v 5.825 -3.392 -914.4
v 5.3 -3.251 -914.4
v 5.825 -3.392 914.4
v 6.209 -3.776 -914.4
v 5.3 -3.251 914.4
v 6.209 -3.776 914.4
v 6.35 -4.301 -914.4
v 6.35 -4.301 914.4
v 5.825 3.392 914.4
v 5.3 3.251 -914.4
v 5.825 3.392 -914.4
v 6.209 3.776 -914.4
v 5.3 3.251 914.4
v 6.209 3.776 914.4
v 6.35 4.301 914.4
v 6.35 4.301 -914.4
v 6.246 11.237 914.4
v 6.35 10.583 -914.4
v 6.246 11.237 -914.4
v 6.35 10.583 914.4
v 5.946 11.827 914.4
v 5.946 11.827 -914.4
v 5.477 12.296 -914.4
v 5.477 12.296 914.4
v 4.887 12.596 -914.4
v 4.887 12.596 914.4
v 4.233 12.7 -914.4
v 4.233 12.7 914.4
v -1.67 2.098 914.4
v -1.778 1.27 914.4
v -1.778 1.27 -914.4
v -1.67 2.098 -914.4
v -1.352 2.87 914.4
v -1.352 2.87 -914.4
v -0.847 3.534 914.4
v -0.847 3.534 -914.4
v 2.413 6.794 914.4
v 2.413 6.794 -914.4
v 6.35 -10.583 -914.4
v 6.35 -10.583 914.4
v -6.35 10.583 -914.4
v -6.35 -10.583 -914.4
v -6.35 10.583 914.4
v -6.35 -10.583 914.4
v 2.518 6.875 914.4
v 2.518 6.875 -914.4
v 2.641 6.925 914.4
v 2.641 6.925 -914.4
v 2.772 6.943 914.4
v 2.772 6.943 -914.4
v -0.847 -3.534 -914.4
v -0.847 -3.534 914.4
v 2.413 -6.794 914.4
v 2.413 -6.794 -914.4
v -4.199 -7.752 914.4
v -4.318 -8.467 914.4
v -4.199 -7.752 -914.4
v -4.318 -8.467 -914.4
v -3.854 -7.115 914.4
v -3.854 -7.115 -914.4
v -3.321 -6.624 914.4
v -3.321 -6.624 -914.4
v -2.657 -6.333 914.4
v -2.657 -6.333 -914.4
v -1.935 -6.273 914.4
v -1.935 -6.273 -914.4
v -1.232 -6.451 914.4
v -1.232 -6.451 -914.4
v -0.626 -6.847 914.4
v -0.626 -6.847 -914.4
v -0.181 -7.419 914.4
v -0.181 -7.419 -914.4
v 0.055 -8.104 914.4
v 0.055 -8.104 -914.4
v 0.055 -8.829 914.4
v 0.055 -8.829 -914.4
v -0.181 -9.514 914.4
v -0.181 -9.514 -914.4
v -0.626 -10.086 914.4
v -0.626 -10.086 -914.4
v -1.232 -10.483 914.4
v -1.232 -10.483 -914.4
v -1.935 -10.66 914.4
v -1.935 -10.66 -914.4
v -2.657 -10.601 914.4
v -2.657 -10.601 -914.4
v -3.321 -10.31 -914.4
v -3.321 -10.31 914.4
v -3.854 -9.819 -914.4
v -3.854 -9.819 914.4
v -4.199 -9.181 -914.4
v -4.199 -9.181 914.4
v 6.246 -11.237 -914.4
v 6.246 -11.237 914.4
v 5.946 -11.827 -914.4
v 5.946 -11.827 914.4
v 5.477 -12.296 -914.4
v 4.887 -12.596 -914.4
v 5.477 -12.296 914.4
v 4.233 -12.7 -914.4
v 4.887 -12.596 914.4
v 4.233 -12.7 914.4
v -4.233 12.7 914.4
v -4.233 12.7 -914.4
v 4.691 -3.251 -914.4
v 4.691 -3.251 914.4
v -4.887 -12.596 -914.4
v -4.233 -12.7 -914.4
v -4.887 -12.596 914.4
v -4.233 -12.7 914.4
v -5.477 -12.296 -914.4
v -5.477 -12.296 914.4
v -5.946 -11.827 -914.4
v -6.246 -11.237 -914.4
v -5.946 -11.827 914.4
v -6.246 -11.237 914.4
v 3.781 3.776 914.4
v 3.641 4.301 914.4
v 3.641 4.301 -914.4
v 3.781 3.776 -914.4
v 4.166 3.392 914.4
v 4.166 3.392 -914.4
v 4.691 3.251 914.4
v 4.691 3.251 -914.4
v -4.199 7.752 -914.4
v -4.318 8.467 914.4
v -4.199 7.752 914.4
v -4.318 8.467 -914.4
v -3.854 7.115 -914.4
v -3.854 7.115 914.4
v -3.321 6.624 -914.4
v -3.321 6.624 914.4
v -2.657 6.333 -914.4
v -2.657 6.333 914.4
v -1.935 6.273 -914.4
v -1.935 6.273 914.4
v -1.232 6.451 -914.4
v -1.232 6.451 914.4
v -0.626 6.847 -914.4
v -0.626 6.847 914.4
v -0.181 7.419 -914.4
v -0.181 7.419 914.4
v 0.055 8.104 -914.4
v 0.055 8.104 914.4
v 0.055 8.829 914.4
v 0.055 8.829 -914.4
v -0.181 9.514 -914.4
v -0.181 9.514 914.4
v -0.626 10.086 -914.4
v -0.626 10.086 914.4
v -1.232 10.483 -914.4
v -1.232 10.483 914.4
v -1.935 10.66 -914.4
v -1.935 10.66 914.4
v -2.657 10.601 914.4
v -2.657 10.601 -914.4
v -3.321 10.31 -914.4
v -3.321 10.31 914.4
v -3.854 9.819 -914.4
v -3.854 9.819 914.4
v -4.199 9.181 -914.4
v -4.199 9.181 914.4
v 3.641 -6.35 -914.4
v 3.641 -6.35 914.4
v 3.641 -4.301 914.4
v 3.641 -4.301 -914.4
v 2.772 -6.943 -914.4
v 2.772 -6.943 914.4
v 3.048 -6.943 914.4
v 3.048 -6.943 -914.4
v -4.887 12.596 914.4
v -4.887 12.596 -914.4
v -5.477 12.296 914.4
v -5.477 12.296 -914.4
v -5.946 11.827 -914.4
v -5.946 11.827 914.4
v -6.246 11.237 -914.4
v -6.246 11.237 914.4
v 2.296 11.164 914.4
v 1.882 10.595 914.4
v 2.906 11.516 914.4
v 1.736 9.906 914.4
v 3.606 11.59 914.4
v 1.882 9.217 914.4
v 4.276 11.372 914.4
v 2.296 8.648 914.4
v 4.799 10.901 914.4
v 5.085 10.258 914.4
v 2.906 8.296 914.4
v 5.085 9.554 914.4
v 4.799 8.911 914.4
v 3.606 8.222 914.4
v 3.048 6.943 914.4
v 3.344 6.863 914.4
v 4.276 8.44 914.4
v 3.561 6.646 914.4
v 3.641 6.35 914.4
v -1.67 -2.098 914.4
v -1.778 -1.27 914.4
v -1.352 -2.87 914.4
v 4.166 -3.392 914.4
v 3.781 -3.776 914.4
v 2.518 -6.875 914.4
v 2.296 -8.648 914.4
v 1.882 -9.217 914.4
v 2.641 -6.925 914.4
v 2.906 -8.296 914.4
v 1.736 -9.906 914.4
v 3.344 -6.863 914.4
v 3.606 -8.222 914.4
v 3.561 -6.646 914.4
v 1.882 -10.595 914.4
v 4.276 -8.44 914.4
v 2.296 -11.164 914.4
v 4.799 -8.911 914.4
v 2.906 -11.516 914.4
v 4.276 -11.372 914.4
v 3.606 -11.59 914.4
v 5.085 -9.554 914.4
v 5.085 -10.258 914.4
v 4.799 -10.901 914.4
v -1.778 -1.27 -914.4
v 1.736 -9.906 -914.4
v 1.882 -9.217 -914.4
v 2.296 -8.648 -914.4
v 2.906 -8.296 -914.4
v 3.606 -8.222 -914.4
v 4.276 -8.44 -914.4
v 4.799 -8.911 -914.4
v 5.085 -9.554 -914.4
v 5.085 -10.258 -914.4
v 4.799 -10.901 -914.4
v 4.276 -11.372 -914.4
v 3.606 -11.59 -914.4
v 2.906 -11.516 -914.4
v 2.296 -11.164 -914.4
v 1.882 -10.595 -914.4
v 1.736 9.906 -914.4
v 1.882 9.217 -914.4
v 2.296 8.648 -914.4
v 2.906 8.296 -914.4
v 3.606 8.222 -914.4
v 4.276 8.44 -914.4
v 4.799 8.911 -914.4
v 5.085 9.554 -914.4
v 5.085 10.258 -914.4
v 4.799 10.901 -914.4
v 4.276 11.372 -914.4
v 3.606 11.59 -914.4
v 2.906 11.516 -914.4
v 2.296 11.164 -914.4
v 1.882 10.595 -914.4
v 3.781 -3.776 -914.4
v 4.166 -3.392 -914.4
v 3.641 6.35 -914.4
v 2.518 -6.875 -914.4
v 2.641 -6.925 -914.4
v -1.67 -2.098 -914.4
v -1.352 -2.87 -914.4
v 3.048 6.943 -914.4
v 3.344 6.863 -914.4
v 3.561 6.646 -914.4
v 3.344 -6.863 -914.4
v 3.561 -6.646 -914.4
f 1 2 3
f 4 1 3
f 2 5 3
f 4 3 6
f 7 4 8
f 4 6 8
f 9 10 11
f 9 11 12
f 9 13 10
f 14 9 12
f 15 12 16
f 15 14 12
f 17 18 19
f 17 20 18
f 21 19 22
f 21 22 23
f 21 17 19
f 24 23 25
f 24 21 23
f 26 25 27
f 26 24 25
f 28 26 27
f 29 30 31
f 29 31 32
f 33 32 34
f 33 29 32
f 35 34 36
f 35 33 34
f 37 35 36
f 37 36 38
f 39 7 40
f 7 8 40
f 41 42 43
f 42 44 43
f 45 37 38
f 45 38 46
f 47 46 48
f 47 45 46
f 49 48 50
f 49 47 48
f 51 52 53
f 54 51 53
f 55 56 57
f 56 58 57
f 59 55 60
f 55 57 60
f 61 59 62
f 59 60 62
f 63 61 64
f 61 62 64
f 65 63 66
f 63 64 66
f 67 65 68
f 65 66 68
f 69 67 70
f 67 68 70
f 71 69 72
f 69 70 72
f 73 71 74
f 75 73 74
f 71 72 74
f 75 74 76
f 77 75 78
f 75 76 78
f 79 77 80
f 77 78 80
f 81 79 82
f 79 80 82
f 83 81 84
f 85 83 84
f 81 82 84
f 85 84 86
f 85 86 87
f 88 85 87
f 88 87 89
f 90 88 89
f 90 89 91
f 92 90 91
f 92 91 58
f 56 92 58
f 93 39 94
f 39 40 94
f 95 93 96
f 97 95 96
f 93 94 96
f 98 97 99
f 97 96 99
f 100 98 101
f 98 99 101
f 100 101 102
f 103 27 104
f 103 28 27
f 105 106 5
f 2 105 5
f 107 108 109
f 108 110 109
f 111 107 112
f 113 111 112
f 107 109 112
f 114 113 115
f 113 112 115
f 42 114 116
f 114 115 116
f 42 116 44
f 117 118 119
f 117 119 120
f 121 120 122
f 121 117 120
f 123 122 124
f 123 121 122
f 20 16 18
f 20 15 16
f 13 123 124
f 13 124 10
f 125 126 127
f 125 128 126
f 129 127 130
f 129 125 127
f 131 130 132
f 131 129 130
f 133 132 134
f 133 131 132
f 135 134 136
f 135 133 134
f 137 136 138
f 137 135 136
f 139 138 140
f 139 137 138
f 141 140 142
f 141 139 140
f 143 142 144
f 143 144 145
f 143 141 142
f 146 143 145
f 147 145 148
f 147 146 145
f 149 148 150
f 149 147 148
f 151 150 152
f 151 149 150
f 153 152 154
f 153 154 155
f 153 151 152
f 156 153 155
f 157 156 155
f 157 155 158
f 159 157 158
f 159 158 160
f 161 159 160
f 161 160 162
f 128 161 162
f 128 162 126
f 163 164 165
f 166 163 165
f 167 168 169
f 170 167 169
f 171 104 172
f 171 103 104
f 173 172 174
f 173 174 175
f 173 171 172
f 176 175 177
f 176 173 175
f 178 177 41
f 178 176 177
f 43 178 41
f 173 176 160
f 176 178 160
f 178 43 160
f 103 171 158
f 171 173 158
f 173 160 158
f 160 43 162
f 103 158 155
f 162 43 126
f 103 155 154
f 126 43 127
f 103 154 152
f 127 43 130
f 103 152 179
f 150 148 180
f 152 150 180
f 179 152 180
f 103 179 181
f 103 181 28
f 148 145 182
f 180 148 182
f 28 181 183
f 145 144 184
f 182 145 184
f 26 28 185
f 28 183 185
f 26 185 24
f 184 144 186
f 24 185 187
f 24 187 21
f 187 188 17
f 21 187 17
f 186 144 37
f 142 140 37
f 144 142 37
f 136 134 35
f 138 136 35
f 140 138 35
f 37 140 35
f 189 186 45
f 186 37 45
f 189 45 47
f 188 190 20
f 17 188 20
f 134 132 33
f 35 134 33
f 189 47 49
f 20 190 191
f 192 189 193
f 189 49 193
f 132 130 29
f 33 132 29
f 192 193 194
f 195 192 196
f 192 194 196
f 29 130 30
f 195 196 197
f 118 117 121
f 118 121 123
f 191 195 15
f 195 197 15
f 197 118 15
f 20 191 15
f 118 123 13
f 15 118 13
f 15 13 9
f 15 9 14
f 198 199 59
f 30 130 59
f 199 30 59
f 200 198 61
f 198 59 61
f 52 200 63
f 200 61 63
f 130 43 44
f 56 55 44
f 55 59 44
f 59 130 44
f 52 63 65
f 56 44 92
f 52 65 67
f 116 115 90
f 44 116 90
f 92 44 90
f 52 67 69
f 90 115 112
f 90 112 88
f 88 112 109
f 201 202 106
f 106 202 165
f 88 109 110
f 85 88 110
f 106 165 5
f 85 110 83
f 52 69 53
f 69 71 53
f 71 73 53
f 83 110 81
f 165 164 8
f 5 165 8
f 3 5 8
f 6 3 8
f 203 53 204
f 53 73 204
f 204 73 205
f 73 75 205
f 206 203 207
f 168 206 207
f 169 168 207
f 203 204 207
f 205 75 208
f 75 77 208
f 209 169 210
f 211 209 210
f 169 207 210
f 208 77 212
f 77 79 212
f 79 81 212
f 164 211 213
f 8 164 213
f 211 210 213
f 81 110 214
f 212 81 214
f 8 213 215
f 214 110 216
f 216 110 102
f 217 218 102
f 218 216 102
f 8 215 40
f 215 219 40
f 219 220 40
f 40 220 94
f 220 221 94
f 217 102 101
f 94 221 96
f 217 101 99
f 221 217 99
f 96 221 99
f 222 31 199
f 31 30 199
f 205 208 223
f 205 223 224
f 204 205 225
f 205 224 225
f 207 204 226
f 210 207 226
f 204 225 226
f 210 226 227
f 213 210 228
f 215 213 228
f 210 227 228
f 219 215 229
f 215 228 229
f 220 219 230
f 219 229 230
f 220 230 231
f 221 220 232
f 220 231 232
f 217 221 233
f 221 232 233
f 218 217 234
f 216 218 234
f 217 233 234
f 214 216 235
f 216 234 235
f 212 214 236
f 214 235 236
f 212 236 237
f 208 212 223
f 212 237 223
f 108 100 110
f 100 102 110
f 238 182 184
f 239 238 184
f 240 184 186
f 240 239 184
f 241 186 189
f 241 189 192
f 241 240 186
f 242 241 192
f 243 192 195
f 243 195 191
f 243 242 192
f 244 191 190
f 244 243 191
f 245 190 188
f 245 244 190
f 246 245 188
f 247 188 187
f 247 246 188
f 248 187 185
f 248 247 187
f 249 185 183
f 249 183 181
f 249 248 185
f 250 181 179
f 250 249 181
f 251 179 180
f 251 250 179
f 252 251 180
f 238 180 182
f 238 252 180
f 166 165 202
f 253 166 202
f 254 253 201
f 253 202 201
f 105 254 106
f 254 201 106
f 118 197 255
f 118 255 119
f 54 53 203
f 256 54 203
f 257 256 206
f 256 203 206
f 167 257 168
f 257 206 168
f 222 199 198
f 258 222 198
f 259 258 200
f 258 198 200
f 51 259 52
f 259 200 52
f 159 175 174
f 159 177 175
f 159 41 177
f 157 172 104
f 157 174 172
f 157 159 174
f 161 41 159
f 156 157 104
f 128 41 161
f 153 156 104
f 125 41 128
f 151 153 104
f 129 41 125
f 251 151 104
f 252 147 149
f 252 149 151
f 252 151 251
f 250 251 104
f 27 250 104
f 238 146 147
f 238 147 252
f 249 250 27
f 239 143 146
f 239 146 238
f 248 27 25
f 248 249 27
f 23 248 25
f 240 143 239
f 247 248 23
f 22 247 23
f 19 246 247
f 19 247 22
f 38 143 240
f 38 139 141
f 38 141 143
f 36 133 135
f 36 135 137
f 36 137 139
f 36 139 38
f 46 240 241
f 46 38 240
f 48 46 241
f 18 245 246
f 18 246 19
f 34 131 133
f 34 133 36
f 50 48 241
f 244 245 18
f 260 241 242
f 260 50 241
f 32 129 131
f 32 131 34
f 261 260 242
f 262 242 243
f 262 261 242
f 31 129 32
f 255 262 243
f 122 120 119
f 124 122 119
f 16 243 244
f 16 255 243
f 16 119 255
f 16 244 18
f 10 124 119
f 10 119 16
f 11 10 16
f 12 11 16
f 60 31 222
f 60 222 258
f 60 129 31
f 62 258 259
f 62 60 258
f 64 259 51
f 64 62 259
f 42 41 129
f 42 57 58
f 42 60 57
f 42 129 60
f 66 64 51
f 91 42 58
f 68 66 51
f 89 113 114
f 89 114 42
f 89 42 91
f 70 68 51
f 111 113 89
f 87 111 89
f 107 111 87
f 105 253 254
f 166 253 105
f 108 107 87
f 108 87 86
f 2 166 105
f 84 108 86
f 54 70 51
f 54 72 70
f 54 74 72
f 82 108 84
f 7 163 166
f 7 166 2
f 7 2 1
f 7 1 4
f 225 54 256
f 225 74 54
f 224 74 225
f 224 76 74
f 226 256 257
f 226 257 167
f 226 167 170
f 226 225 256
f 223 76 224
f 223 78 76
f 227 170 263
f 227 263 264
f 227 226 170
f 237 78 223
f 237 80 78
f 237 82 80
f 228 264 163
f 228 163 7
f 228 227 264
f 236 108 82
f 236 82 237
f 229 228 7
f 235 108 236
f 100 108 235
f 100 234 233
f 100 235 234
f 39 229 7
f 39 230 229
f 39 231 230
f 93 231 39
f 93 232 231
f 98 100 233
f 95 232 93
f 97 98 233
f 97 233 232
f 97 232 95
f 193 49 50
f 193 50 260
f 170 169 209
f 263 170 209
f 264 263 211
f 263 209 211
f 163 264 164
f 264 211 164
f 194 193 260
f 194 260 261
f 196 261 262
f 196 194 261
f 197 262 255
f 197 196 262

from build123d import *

# Parameters (mm, degrees)
SKETCH3_R           = 2.201333333
SKETCH3_R_2         = 1.693333333
BOSS_EXTRUDE1_DEPTH = 914.4


with BuildPart() as part:
    # Sketch3 → Boss-Extrude1 (new, symmetric)
    with BuildSketch(Plane.XY):
        with BuildLine():
            Line((-1.778, 0), (-1.778, 1.27))
            ThreePointArc((-1.778, 1.27), (-1.536070654, 2.494011801), (-0.846666667, 3.533942971))
            Line((-0.846666667, 3.533942971), (2.413267273, 6.793876912))
            ThreePointArc((2.413267273, 6.793876912), (2.578074335, 6.903997469), (2.772477518, 6.942666667))
            Line((2.772477518, 6.942666667), (3.048, 6.942666667))
            ThreePointArc((3.048, 6.942666667), (3.467078619, 6.769078619), (3.640666667, 6.35))
            Line((3.640666667, 6.35), (3.640666667, 4.301066667))
            ThreePointArc((3.640666667, 4.301066667), (3.948165494, 3.558698827), (4.690533333, 3.2512))
            Line((4.690533333, 3.2512), (5.300133333, 3.2512))
            ThreePointArc((5.300133333, 3.2512), (6.042501173, 3.558698827), (6.35, 4.301066667))
            Line((6.35, 4.301066667), (6.35, 10.583333333))
            ThreePointArc((6.35, 10.583333333), (5.730042687, 12.080042687), (4.233333333, 12.7))
            Line((4.233333333, 12.7), (-4.233333333, 12.7))
            ThreePointArc((-4.233333333, 12.7), (-5.730042687, 12.080042687), (-6.35, 10.583333333))
            Line((-6.35, 10.583333333), (-6.35, 0))
            Line((-6.35, 0), (-1.778, 0))
        make_face()
        with Locations(Location((-2.116666667, 8.466666667, 0), (0, 0, 180))):
            Circle(SKETCH3_R, mode=Mode.SUBTRACT)
        with Locations(Location((3.429, 9.906, 0), (0, 0, 180))):
            Circle(SKETCH3_R_2, mode=Mode.SUBTRACT)
    extrude(amount=BOSS_EXTRUDE1_DEPTH, both=True)

    # Mirror1: part across plane


with BuildPart() as part_1:
    add(part.part)
    add(part.part.mirror(Plane.ZX))


solid = part_1.part
